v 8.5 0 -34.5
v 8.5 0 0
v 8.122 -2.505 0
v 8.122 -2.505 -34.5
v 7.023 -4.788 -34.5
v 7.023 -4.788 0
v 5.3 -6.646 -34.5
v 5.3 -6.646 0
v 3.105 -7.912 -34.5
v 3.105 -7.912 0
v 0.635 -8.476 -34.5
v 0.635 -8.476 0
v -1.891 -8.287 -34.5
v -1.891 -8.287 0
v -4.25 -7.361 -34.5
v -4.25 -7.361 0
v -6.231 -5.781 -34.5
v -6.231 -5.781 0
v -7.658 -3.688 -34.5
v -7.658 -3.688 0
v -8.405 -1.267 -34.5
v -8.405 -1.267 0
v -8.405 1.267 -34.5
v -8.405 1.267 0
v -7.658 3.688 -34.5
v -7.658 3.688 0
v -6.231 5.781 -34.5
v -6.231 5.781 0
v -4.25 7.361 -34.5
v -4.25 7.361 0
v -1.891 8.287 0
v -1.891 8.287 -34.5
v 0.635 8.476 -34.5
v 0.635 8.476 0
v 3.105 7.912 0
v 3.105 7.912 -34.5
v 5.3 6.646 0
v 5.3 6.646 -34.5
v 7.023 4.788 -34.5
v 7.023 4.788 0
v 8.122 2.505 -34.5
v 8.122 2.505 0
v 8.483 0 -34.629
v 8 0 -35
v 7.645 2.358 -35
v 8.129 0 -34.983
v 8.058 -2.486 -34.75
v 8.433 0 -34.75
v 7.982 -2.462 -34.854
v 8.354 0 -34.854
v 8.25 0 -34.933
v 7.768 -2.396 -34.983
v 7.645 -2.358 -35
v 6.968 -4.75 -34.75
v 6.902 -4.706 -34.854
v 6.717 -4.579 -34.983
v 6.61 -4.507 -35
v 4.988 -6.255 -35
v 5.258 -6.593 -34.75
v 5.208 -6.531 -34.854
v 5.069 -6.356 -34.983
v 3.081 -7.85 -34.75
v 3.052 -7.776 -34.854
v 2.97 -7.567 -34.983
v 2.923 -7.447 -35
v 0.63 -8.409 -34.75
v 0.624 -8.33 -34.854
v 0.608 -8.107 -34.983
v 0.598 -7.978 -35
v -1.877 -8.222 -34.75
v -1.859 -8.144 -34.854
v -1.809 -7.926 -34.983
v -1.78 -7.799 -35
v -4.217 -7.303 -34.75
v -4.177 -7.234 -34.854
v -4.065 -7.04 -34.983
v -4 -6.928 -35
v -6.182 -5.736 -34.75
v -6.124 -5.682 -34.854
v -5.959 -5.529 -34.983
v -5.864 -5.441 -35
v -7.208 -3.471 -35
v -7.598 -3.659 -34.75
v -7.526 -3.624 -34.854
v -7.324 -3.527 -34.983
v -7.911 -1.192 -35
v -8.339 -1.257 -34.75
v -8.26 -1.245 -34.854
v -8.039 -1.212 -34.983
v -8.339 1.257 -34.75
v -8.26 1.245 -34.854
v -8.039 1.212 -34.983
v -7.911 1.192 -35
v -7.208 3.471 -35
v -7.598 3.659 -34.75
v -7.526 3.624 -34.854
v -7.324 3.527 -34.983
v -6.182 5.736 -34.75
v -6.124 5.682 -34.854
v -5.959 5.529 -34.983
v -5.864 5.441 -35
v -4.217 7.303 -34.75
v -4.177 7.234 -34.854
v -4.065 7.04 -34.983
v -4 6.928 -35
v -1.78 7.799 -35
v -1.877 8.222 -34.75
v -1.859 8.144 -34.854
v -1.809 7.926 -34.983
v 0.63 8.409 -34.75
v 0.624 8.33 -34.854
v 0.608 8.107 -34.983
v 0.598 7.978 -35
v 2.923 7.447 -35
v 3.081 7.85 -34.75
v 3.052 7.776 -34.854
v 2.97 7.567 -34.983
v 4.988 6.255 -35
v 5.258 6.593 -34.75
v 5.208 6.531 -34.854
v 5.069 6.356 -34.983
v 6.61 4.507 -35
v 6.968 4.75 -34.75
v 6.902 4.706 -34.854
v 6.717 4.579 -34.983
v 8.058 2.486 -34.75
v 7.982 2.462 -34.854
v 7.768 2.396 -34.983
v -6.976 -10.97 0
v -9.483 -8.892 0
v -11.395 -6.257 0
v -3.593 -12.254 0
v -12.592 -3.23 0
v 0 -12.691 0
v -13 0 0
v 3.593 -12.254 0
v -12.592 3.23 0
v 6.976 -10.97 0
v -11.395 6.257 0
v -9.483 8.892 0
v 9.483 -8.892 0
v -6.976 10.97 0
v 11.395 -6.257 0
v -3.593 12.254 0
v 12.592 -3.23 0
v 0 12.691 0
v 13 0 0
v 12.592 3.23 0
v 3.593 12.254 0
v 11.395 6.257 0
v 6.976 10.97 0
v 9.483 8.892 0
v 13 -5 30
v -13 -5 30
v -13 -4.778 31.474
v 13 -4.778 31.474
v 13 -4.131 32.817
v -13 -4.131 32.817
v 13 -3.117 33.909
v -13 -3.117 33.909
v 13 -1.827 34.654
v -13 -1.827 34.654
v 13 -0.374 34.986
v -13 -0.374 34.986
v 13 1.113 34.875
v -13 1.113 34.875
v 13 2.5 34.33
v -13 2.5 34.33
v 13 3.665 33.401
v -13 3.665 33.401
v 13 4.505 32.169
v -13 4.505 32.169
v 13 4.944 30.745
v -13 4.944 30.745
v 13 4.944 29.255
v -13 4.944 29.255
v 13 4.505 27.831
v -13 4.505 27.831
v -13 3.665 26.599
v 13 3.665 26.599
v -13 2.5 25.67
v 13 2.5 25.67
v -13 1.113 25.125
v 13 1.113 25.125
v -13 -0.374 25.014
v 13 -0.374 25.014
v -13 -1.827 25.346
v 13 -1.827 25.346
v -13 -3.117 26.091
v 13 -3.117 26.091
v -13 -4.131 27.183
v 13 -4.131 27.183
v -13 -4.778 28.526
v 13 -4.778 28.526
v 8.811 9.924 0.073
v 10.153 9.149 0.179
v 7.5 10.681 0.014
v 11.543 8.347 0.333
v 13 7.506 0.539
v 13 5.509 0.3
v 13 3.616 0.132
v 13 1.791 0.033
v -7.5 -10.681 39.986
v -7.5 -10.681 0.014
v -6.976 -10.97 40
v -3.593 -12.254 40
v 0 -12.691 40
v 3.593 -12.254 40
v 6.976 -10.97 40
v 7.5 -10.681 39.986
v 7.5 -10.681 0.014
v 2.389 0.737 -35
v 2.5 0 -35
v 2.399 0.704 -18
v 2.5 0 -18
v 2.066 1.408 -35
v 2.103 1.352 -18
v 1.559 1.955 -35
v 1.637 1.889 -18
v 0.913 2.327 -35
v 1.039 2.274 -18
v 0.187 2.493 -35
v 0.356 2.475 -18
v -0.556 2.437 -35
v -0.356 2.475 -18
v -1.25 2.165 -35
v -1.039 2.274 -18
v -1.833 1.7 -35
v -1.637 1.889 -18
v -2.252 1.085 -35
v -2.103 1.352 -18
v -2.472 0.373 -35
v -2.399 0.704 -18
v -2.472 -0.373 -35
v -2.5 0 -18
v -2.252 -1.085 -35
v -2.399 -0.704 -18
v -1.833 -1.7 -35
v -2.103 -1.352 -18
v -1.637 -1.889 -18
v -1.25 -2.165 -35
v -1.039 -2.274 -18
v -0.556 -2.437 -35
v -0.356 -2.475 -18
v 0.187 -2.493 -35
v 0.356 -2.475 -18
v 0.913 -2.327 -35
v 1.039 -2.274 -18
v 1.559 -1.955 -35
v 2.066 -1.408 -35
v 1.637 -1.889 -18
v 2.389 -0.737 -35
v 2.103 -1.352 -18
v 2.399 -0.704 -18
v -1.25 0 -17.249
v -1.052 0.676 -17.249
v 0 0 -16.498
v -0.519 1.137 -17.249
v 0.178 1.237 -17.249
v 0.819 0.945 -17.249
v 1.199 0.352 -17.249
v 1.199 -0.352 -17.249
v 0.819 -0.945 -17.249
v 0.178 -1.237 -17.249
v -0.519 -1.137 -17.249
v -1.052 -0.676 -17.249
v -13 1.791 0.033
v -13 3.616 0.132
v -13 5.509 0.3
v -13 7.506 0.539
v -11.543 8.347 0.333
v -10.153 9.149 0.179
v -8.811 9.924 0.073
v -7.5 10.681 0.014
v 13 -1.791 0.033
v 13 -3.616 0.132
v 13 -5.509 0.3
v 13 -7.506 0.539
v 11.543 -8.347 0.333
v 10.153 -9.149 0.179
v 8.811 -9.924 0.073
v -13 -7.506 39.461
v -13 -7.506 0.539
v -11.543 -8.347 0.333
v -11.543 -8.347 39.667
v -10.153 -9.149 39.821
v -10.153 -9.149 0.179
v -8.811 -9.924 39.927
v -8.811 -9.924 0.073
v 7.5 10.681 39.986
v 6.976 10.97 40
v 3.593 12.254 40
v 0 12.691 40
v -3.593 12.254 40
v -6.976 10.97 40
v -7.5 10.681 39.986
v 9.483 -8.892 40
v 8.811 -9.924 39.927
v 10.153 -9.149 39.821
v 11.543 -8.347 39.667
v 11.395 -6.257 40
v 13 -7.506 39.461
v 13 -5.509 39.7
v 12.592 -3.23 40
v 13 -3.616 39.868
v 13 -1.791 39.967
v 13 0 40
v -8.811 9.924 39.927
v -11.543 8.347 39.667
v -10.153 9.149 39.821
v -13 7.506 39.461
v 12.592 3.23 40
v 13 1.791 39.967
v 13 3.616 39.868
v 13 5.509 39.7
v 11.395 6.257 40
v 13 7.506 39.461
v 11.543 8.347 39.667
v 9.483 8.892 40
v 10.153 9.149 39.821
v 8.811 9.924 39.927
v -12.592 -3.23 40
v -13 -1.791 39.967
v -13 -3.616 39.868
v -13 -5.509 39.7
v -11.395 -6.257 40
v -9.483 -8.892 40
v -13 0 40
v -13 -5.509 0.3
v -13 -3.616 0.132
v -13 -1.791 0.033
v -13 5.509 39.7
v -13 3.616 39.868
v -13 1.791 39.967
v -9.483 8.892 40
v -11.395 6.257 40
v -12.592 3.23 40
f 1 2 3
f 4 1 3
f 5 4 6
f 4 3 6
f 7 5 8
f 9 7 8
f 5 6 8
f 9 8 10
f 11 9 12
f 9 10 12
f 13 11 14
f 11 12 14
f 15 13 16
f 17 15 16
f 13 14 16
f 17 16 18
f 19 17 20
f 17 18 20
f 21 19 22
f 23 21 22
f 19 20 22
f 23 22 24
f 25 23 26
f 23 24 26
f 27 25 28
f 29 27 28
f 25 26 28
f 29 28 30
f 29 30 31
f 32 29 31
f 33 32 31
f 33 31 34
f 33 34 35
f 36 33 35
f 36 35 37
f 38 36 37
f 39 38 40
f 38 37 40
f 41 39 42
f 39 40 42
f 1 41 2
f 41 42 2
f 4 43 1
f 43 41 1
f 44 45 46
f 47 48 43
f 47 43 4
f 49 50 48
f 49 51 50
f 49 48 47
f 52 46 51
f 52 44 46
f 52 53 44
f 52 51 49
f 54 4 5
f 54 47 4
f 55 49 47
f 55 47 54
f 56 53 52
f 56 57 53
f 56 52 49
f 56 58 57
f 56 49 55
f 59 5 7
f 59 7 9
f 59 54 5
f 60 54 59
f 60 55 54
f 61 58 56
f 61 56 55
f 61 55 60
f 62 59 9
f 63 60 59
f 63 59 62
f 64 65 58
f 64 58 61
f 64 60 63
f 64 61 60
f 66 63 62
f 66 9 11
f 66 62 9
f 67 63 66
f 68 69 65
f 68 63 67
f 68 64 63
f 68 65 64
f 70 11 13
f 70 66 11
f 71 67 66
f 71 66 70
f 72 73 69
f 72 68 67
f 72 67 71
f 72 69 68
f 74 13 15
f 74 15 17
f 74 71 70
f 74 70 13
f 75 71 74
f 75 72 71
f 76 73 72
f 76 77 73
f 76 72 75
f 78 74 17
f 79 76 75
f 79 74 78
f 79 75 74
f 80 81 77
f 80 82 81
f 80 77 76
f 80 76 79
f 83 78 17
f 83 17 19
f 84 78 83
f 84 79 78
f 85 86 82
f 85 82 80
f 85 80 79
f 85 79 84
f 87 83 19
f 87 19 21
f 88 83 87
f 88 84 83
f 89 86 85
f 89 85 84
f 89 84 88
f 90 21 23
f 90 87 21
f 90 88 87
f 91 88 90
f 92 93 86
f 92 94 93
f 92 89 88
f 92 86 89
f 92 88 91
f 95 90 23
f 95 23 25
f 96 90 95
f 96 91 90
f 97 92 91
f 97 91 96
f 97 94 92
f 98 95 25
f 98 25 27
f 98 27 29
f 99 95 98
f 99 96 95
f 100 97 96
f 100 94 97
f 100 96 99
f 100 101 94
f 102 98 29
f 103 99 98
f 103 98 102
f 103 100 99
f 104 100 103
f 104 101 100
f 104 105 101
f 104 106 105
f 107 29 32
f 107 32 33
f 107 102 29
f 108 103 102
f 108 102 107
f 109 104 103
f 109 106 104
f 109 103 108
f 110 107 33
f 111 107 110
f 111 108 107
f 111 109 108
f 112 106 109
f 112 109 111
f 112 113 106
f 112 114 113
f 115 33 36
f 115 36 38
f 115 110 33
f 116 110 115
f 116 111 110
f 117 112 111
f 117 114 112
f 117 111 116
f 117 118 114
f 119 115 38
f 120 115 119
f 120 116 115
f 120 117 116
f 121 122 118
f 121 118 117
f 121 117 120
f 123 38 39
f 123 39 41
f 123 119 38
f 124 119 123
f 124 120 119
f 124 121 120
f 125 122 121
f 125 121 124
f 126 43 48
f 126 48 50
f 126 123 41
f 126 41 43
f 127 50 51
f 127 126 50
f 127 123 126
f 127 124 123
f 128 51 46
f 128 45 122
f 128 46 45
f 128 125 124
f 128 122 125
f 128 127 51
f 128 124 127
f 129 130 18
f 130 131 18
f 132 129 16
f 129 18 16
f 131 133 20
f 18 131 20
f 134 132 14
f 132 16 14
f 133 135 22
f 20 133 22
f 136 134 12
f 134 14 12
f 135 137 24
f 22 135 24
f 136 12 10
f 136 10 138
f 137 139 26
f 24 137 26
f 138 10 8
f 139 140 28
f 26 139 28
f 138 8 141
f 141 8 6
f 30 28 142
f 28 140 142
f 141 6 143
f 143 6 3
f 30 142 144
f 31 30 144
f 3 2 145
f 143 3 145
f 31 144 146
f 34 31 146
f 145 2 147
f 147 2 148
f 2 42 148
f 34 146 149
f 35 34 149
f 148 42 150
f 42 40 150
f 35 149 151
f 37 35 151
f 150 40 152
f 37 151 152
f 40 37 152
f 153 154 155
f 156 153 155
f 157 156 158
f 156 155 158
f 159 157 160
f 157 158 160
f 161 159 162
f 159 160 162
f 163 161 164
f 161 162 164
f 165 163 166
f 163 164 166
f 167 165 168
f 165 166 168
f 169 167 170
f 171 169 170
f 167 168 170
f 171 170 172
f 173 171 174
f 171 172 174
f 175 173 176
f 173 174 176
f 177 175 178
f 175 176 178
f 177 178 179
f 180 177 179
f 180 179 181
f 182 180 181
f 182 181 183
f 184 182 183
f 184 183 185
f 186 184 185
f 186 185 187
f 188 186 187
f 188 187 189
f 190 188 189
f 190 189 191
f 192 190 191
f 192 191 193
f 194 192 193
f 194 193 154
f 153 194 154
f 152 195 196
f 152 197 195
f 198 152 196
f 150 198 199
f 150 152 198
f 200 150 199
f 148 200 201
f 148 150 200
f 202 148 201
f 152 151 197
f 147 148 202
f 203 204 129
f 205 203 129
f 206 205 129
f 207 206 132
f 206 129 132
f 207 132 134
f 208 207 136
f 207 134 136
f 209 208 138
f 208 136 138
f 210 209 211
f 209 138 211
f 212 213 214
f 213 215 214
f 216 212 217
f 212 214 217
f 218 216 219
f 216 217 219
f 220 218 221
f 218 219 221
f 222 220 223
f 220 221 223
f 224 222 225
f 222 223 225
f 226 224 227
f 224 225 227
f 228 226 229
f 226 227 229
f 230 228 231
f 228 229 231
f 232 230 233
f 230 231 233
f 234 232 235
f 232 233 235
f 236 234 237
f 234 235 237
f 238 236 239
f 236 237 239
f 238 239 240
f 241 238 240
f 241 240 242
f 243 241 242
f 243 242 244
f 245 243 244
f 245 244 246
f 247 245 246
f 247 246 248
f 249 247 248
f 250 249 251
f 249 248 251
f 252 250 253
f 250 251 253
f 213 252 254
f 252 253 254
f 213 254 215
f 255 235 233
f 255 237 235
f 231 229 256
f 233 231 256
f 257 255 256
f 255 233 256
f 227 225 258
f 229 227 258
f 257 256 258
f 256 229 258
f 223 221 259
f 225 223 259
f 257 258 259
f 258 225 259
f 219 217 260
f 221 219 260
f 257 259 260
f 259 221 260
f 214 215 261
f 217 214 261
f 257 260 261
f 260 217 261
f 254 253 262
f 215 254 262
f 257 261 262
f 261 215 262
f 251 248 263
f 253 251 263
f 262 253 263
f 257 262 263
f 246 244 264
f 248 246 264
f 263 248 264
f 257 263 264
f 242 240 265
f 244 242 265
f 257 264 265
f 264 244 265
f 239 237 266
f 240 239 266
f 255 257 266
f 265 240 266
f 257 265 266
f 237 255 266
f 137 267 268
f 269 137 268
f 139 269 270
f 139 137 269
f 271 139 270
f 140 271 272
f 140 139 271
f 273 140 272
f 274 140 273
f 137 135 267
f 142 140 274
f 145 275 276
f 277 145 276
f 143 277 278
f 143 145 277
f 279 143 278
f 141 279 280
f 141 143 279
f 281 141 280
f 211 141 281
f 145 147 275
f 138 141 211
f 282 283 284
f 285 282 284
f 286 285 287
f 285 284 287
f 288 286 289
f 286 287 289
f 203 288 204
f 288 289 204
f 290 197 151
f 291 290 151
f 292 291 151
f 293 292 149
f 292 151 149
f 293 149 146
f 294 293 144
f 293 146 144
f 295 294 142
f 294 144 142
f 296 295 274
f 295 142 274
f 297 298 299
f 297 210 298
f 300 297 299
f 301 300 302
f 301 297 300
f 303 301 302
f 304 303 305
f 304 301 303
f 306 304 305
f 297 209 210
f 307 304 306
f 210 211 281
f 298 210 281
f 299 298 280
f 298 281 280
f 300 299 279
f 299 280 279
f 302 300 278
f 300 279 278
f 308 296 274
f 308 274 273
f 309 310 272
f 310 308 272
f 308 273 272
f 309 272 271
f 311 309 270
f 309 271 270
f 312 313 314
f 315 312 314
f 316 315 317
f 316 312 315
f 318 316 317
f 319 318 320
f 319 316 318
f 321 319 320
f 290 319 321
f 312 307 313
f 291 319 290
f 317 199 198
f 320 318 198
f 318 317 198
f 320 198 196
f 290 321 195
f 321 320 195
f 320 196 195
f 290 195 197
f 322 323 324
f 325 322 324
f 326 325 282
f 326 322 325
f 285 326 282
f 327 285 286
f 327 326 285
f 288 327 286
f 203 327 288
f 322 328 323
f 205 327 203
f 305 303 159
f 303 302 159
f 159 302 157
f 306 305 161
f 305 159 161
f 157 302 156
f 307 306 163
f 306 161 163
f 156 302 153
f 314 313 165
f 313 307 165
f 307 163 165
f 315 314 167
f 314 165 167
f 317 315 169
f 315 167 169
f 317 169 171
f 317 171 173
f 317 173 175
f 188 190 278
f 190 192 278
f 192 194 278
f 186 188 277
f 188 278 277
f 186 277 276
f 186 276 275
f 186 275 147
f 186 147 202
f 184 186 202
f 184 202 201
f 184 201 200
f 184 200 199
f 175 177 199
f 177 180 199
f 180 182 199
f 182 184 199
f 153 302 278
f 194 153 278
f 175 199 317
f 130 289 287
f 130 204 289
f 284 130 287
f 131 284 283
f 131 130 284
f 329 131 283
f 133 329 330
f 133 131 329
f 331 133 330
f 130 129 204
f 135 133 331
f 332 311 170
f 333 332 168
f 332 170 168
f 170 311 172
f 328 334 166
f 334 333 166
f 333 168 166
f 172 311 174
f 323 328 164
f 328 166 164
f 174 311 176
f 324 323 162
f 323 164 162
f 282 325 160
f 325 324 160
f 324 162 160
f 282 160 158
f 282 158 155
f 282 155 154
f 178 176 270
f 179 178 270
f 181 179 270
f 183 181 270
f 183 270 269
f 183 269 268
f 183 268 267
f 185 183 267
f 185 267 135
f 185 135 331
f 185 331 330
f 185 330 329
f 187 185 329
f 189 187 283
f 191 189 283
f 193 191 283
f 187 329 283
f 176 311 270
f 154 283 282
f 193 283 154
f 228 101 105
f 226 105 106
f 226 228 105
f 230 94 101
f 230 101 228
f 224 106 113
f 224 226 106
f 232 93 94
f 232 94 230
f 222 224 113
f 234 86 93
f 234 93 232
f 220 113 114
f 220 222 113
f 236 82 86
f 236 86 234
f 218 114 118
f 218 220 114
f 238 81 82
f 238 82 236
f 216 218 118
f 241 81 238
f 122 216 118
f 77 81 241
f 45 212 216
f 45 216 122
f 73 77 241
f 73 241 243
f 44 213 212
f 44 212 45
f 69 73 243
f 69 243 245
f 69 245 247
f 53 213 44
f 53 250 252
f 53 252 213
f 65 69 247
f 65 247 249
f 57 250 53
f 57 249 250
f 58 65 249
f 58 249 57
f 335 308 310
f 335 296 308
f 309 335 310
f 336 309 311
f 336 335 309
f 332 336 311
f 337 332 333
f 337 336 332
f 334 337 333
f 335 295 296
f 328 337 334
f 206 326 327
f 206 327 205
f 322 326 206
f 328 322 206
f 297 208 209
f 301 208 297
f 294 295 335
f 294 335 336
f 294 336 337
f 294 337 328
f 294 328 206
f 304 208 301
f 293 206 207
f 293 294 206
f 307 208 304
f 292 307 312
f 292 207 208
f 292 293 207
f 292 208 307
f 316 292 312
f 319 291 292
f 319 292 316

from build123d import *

# Parameters (mm, degrees)
RESSALTO_EXTRUS_O1_DEPTH  = 40
ESBO_O2_OUTSIDE_W         = 151.236
ESBO_O2_OUTSIDE_H         = 155.258
ESBO_O2_OUTSIDE_R         = 13
CORTE_EXTRUS_O1_DEPTH     = 15
CORTE_EXTRUS_O1_DRAFT     = -75
ESBO_O3_OUTSIDE_W         = 151.236
ESBO_O3_OUTSIDE_H         = 155.258
ESBO_O3_OUTSIDE_R         = 13
CORTE_EXTRUS_O2_DEPTH     = 15
CORTE_EXTRUS_O2_DRAFT     = -75
ESBO_O4_R                 = 8.5
RESSALTO_EXTRUS_O2_DEPTH  = 35
FILETE1_R                 = 0.5
FURO_ROSCADO_DE_M61_D     = 5
FURO_ROSCADO_DE_M61_DEPTH = 17
FURO_ROSCADO_DE_M61_TIP   = 1.502151548
ESBO_O7_R                 = 5
CORTE_EXTRUS_O3_DEPTH     = 51.013331556
FILETE2_R                 = 15
FILETE3_R                 = 15


with BuildPart() as part:
    # Esboço1 → Ressalto-extrusão1 (new body)
    with BuildSketch(Plane.XY):
        Polygon((0, 15.011106999), (-13, 7.505553499), (-13, -7.505553499), (0, -15.011106999), (13, -7.505553499), (13, 7.505553499), align=None)
    extrude(amount=RESSALTO_EXTRUS_O1_DEPTH)


with BuildPart() as corte_extrus_o1_tool:
    # Esboço2 outside → Corte-extrusão1 (with draft: the straight prism first)
    with BuildSketch(Plane.XY.offset(40)):
        Rectangle(ESBO_O2_OUTSIDE_W, ESBO_O2_OUTSIDE_H)
        Circle(ESBO_O2_OUTSIDE_R, mode=Mode.SUBTRACT)
    extrude(amount=-CORTE_EXTRUS_O1_DEPTH)
    # Corte-extrusão1: the draft: its side faces are tilted about the plane it starts from
    corte_extrus_o1_sides = [corte_extrus_o1_tool.faces().sort_by_distance(p)[0] for p in [
        (0, -77.629, 32.5),
        (75.618, 0, 32.5),
        (0, 77.629, 32.5),
        (-75.618, 0, 32.5),
        (-13, 0, 32.5),
    ]]
    draft(corte_extrus_o1_sides, Plane.XY.offset(40), CORTE_EXTRUS_O1_DRAFT)


with BuildPart() as part_1:
    add(part.part)

    # Corte-extrusão1: cut by corte_extrus_o1_tool
    add(corte_extrus_o1_tool.part, mode=Mode.SUBTRACT)


with BuildPart() as corte_extrus_o2_tool:
    # Esboço3 outside → Corte-extrusão2 (with draft: the straight prism first)
    with BuildSketch(Plane(origin=(0, 0, 0), x_dir=(-1, 0, 0), z_dir=(0, 0, -1))):
        Rectangle(ESBO_O3_OUTSIDE_W, ESBO_O3_OUTSIDE_H)
        Circle(ESBO_O3_OUTSIDE_R, mode=Mode.SUBTRACT)
    extrude(amount=-CORTE_EXTRUS_O2_DEPTH)
    # Corte-extrusão2: the draft: its side faces are tilted about the plane it starts from
    corte_extrus_o2_sides = [corte_extrus_o2_tool.faces().sort_by_distance(p)[0] for p in [
        (0, -77.629, 7.5),
        (-75.618, 0, 7.5),
        (0, 77.629, 7.5),
        (75.618, 0, 7.5),
        (13, 0, 7.5),
    ]]
    draft(corte_extrus_o2_sides, Plane(origin=(0, 0, 0), x_dir=(-1, 0, 0), z_dir=(0, 0, -1)), CORTE_EXTRUS_O2_DRAFT)


with BuildPart() as part_2:
    add(part_1.part)

    # Corte-extrusão2: cut by corte_extrus_o2_tool
    add(corte_extrus_o2_tool.part, mode=Mode.SUBTRACT)

    # Esboço4 → Ressalto-extrusão2 (add)
    with BuildSketch(Plane(origin=(0, 0, 0), x_dir=(-1, 0, 0), z_dir=(0, 0, -1))):
        with Locations(Location((0, 0, 0), (0, 0, 180))):
            Circle(ESBO_O4_R)
    extrude(amount=RESSALTO_EXTRUS_O2_DEPTH)

    # Filete1
    filete1_edges = [part_2.edges().sort_by_distance(p)[0] for p in [
        (-8.5, 0, -35),
    ]]
    fillet(filete1_edges, radius=FILETE1_R)

    # Furo roscado de M61
    with Locations(Plane(origin=(0, 0, -35), x_dir=(-1, 0, 0), z_dir=(0, 0, -1))):
        with Locations((0, 0)):
            Hole(FURO_ROSCADO_DE_M61_D / 2, depth=FURO_ROSCADO_DE_M61_DEPTH)
            with Locations((0, 0, -(FURO_ROSCADO_DE_M61_DEPTH + FURO_ROSCADO_DE_M61_TIP / 2))):  # 118° drill point
                Cone(0, FURO_ROSCADO_DE_M61_D / 2, FURO_ROSCADO_DE_M61_TIP, mode=Mode.SUBTRACT)

    # Esboço7 → Corte-extrusão3 (cut, through all)
    with BuildSketch(Plane.ZY.offset(13)):
        with Locations(Location((30, 0, 0), (0, 0, 270))):
            Circle(ESBO_O7_R)
    extrude(amount=-CORTE_EXTRUS_O3_DEPTH, mode=Mode.SUBTRACT)

    # Filete2
    # the kernel refuses this fillet: 15 mm, written as the material it takes off along each edge
    with BuildSketch(Plane(origin=(0, 15.011106999, -21.111760598), x_dir=(0.8660254037844415, -0.49999999999999506, 0), z_dir=(0, 0, 1))) as filete2_piece_1:
        with BuildLine():
            CenterArc((FILETE2_R * 0.57735026919, -FILETE2_R), FILETE2_R, 90, 60)
            Line((-FILETE2_R * 0.288675134595, -FILETE2_R * 0.5), (0, 0))
            Line((0, 0), (FILETE2_R * 0.57735026919, 0))
        make_face()
    extrude(amount=82.223521197, mode=Mode.SUBTRACT)

    # Filete3
    # the kernel refuses this fillet: 15 mm, written as the material it takes off along each edge
    with BuildSketch(Plane(origin=(0, -15.011106999, -21.111760598), x_dir=(0.8660254037844344, 0.5000000000000074, 0), z_dir=(0, 0, 1))) as filete3_piece_1:
        with BuildLine():
            CenterArc((FILETE3_R * 0.57735026919, FILETE3_R), FILETE3_R, 210, 60)
            Line((-FILETE3_R * 0.288675134595, FILETE3_R * 0.5), (0, 0))
            Line((0, 0), (FILETE3_R * 0.57735026919, 0))
        make_face()
    extrude(amount=82.223521197, mode=Mode.SUBTRACT)


solid = part_2.part
